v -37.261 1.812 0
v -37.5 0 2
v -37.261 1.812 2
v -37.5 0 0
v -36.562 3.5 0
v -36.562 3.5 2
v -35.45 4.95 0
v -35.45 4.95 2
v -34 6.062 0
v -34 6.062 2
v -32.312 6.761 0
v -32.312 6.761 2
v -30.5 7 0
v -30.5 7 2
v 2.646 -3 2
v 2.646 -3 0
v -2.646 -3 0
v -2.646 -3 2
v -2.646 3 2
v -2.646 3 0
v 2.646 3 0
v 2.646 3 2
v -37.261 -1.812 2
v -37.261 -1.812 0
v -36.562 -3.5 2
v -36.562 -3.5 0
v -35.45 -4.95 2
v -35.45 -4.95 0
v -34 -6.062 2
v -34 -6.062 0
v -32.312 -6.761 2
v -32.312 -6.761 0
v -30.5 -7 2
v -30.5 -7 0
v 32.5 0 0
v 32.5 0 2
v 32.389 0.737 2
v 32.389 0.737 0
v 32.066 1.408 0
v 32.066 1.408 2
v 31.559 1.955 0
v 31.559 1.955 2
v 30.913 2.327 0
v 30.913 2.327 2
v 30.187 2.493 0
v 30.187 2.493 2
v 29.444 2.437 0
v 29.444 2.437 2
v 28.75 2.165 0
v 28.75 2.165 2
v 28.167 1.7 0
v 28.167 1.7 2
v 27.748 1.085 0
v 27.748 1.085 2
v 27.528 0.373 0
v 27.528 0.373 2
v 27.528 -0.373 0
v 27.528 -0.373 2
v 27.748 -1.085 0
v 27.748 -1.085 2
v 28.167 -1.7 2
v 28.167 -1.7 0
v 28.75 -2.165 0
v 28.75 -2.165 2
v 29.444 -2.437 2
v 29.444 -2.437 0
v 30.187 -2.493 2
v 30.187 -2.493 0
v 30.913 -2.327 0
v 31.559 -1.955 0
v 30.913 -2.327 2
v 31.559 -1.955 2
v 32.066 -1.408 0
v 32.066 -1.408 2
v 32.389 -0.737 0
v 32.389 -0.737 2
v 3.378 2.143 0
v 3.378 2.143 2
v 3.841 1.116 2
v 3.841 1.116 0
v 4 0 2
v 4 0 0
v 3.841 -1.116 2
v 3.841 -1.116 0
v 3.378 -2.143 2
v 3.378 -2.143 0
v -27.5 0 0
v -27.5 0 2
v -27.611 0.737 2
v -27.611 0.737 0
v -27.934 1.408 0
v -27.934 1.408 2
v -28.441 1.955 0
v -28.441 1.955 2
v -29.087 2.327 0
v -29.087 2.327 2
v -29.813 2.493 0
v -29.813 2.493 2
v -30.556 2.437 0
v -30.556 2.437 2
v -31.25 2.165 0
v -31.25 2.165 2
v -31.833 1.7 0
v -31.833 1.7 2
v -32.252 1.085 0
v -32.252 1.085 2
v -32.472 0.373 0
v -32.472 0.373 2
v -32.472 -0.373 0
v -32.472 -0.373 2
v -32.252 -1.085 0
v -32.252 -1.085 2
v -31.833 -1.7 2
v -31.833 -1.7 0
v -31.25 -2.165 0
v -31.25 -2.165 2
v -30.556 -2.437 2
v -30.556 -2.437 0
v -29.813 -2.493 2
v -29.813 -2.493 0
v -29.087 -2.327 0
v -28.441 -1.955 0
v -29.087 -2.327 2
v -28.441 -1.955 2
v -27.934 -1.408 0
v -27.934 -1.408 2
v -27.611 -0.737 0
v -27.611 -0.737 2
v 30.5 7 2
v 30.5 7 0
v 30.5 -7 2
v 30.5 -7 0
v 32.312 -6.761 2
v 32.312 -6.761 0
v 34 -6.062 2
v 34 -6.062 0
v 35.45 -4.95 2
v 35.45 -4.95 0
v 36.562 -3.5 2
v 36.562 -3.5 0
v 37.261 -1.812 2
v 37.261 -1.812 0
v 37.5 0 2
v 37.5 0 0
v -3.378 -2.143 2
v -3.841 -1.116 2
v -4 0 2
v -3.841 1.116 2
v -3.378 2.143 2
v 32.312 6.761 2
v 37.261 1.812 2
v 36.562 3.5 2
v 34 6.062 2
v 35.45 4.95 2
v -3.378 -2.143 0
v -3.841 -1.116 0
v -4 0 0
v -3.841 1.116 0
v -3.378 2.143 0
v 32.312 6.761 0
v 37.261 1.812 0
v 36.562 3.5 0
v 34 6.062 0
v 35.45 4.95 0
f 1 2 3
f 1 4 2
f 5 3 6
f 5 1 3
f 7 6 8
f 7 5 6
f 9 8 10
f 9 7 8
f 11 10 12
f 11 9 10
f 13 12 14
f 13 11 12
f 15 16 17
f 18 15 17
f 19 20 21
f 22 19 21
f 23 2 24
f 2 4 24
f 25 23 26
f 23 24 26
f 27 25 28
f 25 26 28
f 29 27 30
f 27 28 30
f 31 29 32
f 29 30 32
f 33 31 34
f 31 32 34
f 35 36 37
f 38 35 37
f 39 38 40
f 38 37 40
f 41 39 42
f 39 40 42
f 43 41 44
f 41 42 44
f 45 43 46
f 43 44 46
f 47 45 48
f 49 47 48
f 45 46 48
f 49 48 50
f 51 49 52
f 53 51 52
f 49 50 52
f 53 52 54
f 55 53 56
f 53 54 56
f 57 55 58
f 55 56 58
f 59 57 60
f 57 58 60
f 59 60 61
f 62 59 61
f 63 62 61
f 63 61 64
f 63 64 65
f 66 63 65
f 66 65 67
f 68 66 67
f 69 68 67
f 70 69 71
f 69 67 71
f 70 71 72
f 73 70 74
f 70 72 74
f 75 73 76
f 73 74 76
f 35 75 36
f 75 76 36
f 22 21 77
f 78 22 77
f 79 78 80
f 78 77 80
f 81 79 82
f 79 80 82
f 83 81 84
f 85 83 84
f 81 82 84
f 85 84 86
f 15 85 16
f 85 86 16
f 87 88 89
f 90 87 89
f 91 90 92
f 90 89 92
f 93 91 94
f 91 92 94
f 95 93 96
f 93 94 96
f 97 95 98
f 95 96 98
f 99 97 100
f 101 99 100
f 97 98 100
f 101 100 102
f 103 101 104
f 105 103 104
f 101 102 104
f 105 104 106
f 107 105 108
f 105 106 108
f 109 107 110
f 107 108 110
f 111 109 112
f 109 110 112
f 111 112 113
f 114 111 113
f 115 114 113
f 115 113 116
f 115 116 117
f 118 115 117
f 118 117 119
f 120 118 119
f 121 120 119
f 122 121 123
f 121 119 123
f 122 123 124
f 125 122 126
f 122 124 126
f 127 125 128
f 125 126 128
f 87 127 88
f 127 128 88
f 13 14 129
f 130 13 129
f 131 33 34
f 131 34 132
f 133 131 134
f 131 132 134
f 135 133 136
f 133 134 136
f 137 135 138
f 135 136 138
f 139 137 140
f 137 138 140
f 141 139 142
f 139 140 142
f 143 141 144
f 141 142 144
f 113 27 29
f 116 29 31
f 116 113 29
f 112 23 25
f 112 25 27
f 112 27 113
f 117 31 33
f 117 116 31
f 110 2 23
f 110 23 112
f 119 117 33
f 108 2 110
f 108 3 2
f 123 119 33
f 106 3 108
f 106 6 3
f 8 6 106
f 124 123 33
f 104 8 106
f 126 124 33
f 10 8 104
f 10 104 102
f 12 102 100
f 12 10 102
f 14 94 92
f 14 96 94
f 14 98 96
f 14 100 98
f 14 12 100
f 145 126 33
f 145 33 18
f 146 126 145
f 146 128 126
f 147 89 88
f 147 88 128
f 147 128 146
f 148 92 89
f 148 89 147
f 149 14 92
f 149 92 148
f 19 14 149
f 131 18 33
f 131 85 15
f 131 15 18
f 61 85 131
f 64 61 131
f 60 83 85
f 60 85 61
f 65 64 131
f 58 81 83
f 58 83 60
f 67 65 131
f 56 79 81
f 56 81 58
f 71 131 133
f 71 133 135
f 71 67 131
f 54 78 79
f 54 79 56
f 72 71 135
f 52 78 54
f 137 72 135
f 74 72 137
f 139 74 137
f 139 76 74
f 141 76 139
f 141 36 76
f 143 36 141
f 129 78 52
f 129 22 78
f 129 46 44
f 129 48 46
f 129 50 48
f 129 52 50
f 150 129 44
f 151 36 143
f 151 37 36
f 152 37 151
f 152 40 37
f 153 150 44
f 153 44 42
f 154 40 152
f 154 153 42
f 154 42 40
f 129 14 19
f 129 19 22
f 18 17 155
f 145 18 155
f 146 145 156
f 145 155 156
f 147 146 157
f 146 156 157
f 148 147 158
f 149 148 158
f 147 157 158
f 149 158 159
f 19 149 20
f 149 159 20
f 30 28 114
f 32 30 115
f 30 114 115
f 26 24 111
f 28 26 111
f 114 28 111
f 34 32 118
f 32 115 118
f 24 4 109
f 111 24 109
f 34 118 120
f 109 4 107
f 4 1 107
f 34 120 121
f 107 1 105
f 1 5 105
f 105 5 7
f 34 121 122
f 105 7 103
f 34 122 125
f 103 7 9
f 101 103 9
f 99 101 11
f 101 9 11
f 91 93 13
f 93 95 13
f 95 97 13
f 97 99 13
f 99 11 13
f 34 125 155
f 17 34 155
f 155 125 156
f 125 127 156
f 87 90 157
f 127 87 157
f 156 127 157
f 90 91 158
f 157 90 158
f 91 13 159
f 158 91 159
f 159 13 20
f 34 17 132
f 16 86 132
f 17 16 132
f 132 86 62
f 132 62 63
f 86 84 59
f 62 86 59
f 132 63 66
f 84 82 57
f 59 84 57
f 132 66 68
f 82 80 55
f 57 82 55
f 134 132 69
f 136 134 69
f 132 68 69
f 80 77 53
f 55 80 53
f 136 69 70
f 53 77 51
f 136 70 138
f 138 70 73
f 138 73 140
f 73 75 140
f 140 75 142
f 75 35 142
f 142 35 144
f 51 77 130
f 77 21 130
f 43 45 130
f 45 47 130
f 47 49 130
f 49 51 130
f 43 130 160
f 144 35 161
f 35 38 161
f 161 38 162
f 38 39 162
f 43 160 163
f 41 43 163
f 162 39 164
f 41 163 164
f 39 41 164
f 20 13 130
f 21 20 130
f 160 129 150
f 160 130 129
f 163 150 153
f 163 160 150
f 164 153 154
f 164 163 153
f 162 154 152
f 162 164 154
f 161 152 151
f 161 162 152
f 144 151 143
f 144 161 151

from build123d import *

# Parameters (mm, degrees)
EXTRUDE_1_DEPTH     = 2
SKETCH_2_W          = 75
SKETCH_2_H          = 14
SKETCH_2_R          = 2.5
EXTRUDE_2_DEPTH     = 2
CUT_EXTRUDE_2_DEPTH = 39.20013089
FILLET_1_R          = 7


with BuildPart() as part:
    # 草图1 → 凸台-拉伸1 (new body)
    with BuildSketch(Plane.XY):
        with BuildLine():
            Line((-2.645751311, 3), (2.645751311, 3))
            ThreePointArc((2.645751311, 3), (4, 0), (2.645751311, -3))
            Line((2.645751311, -3), (-2.645751311, -3))
            ThreePointArc((-2.645751311, -3), (-4, 0), (-2.645751311, 3))
        make_face()
    extrude(amount=EXTRUDE_1_DEPTH)

    # 草图2 → 凸台-拉伸2 (add)
    with BuildSketch(Plane.XY.offset(2)):
        Rectangle(SKETCH_2_W, SKETCH_2_H)
        with Locations((-30, 0)):
            Circle(SKETCH_2_R, mode=Mode.SUBTRACT)
        with Locations((30, 0)):
            Circle(SKETCH_2_R, mode=Mode.SUBTRACT)
    extrude(amount=-EXTRUDE_2_DEPTH)

    # 草图3 → 切除-拉伸2 (cut, through all)
    with BuildSketch(Plane.XY):
        with BuildLine():
            Line((-2.645751311, 3), (2.645751311, 3))
            ThreePointArc((2.645751311, 3), (4, 0), (2.645751311, -3))
            Line((2.645751311, -3), (-2.645751311, -3))
            ThreePointArc((-2.645751311, -3), (-4, 0), (-2.645751311, 3))
        make_face()
    extrude(amount=CUT_EXTRUDE_2_DEPTH, mode=Mode.SUBTRACT)

    # 圆角1
    fillet_1_edges = [part.edges().sort_by_distance(p)[0] for p in [
        (37.5, -7, 1),
        (37.5, 7, 1),
        (-37.5, -7, 1),
        (-37.5, 7, 1),
    ]]
    fillet(fillet_1_edges, radius=FILLET_1_R - 0.0001)  # a hair under: the kernel refuses the full size


solid = part.part
